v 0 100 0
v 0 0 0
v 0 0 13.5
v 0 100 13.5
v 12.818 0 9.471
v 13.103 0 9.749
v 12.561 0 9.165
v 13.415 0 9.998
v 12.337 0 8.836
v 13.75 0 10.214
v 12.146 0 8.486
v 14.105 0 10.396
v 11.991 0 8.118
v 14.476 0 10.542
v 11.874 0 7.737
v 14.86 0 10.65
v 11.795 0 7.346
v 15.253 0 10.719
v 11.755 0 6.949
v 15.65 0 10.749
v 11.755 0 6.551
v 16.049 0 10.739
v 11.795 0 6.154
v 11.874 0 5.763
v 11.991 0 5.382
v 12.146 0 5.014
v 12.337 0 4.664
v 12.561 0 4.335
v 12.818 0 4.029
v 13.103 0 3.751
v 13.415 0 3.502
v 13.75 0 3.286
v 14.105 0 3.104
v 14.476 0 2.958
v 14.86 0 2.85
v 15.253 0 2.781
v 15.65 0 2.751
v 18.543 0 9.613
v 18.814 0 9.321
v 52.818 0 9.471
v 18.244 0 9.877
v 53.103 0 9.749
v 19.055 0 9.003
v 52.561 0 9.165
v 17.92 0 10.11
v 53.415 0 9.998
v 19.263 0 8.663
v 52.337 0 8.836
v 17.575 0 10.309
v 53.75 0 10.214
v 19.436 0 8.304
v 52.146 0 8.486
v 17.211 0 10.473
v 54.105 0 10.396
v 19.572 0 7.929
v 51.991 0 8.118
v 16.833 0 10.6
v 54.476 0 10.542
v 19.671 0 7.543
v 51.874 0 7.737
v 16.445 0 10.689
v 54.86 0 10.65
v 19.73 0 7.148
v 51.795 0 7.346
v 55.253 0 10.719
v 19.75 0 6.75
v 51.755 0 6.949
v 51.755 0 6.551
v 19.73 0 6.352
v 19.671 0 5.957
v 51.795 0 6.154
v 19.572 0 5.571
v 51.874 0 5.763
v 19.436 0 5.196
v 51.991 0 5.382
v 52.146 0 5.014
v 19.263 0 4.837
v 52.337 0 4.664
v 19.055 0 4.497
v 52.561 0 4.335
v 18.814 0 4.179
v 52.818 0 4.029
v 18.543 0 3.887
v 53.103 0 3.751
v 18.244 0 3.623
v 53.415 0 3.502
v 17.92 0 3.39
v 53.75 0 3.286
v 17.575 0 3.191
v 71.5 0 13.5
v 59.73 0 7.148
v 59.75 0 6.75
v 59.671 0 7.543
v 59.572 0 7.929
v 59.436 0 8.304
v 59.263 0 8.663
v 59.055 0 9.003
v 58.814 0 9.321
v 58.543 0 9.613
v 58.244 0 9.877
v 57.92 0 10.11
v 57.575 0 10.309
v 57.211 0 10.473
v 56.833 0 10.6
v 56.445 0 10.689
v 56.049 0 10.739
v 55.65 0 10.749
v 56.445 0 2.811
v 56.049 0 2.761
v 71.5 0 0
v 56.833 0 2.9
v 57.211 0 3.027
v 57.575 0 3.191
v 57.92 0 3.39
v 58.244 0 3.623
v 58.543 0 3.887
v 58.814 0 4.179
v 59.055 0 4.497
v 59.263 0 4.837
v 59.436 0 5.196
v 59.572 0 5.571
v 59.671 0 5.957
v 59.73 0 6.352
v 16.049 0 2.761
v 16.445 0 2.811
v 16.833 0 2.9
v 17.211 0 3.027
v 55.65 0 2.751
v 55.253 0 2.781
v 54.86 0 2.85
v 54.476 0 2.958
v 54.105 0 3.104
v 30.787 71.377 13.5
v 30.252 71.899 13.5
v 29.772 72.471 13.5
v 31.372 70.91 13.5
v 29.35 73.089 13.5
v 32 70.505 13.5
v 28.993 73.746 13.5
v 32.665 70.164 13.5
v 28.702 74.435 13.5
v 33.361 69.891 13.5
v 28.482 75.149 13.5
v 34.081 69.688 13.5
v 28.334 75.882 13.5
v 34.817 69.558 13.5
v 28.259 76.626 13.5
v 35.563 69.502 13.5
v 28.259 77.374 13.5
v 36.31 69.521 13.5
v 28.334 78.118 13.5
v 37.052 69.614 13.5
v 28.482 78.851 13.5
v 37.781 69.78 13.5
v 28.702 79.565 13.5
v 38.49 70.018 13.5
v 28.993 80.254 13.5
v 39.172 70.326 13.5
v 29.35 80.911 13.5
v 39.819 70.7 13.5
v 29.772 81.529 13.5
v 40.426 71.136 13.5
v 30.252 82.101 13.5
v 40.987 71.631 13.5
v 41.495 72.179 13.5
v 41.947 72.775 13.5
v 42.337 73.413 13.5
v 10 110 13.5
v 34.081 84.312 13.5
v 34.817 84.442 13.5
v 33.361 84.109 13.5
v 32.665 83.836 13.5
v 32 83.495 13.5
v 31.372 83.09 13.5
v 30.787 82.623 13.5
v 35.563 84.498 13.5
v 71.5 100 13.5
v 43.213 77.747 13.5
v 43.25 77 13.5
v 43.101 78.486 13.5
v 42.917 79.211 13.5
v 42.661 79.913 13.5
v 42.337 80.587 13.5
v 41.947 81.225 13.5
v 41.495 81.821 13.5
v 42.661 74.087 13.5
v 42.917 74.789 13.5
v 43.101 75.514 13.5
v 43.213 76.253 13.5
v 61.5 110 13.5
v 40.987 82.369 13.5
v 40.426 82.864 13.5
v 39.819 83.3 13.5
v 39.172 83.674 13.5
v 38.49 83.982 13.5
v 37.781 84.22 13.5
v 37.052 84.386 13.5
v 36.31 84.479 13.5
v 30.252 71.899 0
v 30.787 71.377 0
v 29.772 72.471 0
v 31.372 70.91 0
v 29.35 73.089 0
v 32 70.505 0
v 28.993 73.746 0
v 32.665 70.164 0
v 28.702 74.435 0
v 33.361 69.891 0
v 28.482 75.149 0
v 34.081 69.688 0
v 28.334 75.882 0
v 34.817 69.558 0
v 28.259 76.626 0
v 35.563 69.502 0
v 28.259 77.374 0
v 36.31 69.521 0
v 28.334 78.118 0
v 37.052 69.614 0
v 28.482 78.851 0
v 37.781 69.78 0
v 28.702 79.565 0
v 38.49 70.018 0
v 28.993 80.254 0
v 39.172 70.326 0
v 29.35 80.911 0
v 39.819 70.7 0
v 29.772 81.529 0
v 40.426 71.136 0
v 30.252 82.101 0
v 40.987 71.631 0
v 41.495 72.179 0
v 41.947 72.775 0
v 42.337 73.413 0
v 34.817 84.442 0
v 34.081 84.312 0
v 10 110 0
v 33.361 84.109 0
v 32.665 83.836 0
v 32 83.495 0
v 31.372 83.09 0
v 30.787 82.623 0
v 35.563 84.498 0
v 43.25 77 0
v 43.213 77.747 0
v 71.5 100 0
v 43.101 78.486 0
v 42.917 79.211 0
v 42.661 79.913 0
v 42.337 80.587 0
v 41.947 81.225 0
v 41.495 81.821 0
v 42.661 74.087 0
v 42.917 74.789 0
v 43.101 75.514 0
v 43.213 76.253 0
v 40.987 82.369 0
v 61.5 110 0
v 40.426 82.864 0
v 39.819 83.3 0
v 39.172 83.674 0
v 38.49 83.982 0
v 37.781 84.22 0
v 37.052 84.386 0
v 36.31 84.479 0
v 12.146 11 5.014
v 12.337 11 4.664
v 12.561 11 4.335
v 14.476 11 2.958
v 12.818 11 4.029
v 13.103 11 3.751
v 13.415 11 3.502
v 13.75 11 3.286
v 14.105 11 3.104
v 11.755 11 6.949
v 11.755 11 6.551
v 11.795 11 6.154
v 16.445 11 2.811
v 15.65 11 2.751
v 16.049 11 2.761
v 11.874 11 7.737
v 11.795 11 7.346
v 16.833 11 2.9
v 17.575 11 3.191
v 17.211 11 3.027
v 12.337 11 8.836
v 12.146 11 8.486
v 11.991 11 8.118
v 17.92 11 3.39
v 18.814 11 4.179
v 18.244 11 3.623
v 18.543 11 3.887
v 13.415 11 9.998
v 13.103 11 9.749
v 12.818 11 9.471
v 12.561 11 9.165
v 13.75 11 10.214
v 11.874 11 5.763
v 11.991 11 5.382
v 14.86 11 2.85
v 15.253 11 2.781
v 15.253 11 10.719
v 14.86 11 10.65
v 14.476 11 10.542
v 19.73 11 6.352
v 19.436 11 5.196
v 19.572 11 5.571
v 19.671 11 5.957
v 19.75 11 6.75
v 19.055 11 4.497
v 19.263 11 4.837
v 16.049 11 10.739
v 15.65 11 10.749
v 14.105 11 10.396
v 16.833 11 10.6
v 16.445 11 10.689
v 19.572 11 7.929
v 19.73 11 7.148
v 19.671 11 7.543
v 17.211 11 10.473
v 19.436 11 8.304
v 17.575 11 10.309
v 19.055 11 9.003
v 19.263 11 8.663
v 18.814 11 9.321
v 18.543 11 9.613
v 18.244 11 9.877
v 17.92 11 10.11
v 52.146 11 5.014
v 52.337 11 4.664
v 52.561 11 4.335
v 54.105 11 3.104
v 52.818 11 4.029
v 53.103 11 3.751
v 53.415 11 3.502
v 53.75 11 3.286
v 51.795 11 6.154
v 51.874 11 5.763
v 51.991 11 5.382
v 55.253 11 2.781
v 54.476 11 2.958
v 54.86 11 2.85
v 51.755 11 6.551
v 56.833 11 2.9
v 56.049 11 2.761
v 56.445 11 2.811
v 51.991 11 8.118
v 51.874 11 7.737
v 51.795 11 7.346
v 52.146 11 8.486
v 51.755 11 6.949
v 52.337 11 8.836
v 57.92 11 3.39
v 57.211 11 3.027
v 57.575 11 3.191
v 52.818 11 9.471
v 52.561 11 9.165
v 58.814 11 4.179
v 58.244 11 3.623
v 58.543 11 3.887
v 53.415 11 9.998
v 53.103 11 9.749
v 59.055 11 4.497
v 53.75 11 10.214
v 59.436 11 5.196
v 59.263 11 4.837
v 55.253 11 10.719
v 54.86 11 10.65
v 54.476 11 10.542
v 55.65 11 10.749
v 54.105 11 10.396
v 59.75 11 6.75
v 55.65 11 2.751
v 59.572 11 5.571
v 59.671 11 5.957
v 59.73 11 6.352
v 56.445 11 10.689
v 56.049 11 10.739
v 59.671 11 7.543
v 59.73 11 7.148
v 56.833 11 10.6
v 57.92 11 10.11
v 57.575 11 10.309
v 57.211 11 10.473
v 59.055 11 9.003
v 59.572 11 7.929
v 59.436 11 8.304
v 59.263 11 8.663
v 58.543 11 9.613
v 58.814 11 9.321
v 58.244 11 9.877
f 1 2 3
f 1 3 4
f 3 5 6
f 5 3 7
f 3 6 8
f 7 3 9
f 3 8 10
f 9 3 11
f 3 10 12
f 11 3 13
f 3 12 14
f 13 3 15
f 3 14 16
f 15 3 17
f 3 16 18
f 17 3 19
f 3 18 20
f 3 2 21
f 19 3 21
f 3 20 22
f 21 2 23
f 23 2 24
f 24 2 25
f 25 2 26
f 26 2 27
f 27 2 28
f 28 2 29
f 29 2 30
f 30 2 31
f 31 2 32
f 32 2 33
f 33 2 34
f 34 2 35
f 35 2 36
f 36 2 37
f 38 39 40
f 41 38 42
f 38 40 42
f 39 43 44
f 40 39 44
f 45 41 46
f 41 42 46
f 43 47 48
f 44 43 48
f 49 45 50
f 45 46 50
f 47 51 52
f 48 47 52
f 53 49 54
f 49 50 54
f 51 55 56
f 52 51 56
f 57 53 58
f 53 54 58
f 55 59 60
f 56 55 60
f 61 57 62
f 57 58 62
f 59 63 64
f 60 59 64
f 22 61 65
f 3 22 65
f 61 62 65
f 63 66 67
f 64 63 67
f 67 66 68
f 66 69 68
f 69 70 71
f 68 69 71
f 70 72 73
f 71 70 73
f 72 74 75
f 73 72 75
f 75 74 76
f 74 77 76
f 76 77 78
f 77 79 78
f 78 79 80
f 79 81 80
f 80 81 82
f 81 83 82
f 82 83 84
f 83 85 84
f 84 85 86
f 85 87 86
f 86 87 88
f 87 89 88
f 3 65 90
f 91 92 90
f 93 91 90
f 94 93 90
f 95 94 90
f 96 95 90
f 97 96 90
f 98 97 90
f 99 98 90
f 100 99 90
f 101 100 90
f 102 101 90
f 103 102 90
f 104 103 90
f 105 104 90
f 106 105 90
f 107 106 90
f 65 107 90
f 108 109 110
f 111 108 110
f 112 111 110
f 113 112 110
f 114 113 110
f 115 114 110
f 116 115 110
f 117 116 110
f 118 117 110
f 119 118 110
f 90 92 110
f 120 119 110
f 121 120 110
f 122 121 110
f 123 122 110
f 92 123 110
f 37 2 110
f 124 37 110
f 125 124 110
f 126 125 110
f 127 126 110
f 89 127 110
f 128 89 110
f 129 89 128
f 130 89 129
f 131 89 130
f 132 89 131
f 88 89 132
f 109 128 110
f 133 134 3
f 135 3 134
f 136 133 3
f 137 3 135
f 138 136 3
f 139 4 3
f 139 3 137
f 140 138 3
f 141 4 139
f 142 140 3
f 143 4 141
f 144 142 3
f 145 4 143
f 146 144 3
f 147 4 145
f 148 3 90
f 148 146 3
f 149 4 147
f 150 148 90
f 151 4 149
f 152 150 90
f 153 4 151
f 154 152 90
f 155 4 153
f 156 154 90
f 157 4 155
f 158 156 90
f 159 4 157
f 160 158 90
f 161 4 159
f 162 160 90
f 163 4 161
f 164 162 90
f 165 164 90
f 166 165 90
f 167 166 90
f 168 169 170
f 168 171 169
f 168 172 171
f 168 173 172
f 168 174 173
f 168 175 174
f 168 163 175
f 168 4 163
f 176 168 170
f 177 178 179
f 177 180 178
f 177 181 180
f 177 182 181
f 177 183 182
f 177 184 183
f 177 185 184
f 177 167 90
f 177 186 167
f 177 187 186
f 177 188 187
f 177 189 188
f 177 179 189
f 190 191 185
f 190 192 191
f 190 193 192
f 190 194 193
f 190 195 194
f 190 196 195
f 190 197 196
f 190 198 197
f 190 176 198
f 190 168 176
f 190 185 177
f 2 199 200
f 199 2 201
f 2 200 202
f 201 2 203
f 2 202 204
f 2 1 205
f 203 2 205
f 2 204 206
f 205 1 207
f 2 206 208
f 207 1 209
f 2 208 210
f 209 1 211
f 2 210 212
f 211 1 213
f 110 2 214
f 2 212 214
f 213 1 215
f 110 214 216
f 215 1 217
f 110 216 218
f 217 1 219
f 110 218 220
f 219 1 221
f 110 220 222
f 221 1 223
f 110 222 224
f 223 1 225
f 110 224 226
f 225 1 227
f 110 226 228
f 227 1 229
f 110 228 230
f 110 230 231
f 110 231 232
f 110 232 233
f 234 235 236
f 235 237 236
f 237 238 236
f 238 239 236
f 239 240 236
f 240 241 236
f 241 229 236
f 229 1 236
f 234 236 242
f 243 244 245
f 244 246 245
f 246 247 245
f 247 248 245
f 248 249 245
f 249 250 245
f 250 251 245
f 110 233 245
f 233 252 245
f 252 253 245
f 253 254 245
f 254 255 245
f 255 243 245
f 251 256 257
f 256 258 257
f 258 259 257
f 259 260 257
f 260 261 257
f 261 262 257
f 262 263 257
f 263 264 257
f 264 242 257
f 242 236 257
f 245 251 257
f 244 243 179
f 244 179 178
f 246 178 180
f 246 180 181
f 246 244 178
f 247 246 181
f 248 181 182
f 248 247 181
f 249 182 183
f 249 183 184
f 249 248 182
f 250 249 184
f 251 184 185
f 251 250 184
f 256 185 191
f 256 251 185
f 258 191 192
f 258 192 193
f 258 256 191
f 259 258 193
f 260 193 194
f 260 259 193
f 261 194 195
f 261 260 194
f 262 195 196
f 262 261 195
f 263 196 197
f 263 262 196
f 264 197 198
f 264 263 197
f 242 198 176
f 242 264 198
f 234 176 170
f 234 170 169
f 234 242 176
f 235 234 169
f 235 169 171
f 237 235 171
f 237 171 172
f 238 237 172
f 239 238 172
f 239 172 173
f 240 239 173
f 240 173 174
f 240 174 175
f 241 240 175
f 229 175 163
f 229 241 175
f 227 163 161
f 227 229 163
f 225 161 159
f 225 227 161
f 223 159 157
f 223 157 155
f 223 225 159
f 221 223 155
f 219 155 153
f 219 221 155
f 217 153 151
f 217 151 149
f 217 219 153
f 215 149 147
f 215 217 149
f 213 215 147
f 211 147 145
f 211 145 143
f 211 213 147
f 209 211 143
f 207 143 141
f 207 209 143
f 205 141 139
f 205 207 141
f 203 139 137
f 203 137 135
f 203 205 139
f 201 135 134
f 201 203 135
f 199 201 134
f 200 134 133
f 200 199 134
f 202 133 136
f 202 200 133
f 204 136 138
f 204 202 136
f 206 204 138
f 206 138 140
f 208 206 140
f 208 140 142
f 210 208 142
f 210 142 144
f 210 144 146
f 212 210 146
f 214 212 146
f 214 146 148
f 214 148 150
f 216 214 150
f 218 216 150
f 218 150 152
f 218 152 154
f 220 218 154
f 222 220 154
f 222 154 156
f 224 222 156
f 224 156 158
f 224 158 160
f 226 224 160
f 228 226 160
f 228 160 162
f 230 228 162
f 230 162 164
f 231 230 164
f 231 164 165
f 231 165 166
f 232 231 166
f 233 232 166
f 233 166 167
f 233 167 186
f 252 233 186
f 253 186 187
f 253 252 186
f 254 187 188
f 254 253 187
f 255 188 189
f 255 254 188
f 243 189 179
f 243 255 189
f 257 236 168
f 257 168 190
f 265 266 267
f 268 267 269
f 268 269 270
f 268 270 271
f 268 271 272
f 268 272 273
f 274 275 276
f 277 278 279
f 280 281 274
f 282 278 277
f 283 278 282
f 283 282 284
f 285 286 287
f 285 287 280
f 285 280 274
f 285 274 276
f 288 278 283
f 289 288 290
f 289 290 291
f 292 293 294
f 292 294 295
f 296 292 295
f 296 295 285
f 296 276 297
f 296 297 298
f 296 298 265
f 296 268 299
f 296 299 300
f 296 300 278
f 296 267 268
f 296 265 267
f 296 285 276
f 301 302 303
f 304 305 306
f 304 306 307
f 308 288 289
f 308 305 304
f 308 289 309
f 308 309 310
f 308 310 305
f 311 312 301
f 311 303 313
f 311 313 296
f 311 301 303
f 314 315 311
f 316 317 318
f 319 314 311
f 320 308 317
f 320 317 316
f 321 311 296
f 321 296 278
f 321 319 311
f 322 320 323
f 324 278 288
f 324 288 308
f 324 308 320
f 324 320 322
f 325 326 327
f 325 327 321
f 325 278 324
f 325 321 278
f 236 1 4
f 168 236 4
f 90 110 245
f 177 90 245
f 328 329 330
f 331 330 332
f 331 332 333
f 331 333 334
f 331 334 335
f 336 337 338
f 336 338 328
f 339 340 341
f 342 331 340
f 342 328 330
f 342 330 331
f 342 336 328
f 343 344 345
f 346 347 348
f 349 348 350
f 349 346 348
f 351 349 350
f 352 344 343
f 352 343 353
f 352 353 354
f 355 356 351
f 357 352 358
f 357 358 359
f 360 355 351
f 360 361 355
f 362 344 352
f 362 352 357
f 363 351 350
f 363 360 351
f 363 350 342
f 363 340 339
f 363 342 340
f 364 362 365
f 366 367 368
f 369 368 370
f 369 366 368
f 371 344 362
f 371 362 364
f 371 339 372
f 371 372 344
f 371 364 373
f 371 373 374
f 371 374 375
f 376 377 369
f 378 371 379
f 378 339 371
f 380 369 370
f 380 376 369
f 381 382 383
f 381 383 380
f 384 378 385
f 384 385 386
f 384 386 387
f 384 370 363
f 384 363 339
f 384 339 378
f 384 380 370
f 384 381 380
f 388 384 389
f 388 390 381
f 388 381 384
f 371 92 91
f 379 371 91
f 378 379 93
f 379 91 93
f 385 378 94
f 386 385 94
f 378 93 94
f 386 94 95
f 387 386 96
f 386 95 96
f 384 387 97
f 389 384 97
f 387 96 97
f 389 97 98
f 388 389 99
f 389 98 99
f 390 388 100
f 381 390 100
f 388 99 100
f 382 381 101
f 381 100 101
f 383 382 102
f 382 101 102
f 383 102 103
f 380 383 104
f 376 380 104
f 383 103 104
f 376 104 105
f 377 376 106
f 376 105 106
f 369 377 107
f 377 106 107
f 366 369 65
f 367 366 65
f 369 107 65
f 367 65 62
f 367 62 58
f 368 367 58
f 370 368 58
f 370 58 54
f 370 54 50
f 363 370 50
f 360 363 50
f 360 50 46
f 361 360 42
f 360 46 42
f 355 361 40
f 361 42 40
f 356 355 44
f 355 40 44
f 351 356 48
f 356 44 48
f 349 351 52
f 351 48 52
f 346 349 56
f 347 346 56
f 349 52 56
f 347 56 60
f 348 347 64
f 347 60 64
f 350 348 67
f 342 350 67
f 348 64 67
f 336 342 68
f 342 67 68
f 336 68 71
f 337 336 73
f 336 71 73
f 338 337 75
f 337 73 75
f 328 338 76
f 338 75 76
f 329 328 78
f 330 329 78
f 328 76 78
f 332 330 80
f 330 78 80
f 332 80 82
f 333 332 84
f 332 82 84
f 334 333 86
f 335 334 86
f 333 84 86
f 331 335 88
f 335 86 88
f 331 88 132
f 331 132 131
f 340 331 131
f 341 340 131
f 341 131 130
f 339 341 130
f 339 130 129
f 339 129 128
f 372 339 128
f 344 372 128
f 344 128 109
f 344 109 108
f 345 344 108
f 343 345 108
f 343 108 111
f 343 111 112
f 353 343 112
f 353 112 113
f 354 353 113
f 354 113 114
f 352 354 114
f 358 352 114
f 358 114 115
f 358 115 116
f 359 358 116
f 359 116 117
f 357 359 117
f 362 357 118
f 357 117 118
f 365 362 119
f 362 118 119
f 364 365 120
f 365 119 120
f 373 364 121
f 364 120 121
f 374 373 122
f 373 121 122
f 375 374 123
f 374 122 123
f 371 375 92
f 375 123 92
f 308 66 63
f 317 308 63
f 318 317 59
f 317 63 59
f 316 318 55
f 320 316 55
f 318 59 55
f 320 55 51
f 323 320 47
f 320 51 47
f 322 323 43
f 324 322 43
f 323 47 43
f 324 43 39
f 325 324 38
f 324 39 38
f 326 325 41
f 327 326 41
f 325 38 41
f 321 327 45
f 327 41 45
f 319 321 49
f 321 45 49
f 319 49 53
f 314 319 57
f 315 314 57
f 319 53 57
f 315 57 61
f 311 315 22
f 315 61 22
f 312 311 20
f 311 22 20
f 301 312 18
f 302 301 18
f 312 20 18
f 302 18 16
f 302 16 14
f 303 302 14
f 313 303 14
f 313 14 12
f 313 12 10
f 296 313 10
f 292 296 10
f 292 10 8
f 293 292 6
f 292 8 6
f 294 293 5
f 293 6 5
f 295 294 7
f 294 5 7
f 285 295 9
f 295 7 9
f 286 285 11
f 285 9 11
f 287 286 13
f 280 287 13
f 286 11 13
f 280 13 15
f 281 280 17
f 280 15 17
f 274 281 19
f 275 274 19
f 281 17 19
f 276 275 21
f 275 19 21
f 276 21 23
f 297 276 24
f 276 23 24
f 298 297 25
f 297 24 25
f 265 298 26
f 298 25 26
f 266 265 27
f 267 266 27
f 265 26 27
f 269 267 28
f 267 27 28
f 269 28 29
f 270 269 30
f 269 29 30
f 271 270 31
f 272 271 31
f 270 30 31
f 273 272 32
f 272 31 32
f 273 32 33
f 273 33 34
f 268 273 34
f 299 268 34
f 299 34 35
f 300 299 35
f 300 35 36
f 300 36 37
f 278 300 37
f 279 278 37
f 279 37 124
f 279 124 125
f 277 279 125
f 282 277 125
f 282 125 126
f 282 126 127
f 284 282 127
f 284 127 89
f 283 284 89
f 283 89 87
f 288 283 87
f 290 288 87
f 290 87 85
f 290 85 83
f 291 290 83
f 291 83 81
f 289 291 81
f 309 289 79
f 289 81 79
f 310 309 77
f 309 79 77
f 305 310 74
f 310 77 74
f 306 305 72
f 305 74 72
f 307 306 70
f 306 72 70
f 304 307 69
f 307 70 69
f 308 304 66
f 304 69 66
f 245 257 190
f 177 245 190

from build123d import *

# Parameters (mm, degrees)
SKETCH1_W           = 71.5
SKETCH1_H           = 110
SKETCH1_R           = 7.5
BOSS_EXTRUDE1_DEPTH = 13.5
CHAMFER1_SIZE       = 10
SKETCH2_R           = 4
CUT_EXTRUDE1_DEPTH  = 11


with BuildPart() as part:
    # Sketch1 → Boss-Extrude1 (new body)
    with BuildSketch(Plane.XY):
        with Locations((35.75, 55)):
            Rectangle(SKETCH1_W, SKETCH1_H)
        with Locations((35.75, 77)):
            Circle(SKETCH1_R, mode=Mode.SUBTRACT)
    extrude(amount=BOSS_EXTRUDE1_DEPTH)

    # Chamfer1
    chamfer1_edges = [part.edges().sort_by_distance(p)[0] for p in [
        (0, 110, 6.75),
        (71.5, 110, 6.75),
    ]]
    chamfer(chamfer1_edges, length=CHAMFER1_SIZE)

    # Sketch2 → Cut-Extrude1 (cut)
    with BuildSketch(Plane.XZ):
        with Locations((15.75, 6.75)):
            Circle(SKETCH2_R)
        with Locations((55.75, 6.75)):
            Circle(SKETCH2_R)
    extrude(amount=-CUT_EXTRUDE1_DEPTH, mode=Mode.SUBTRACT)


solid = part.part
